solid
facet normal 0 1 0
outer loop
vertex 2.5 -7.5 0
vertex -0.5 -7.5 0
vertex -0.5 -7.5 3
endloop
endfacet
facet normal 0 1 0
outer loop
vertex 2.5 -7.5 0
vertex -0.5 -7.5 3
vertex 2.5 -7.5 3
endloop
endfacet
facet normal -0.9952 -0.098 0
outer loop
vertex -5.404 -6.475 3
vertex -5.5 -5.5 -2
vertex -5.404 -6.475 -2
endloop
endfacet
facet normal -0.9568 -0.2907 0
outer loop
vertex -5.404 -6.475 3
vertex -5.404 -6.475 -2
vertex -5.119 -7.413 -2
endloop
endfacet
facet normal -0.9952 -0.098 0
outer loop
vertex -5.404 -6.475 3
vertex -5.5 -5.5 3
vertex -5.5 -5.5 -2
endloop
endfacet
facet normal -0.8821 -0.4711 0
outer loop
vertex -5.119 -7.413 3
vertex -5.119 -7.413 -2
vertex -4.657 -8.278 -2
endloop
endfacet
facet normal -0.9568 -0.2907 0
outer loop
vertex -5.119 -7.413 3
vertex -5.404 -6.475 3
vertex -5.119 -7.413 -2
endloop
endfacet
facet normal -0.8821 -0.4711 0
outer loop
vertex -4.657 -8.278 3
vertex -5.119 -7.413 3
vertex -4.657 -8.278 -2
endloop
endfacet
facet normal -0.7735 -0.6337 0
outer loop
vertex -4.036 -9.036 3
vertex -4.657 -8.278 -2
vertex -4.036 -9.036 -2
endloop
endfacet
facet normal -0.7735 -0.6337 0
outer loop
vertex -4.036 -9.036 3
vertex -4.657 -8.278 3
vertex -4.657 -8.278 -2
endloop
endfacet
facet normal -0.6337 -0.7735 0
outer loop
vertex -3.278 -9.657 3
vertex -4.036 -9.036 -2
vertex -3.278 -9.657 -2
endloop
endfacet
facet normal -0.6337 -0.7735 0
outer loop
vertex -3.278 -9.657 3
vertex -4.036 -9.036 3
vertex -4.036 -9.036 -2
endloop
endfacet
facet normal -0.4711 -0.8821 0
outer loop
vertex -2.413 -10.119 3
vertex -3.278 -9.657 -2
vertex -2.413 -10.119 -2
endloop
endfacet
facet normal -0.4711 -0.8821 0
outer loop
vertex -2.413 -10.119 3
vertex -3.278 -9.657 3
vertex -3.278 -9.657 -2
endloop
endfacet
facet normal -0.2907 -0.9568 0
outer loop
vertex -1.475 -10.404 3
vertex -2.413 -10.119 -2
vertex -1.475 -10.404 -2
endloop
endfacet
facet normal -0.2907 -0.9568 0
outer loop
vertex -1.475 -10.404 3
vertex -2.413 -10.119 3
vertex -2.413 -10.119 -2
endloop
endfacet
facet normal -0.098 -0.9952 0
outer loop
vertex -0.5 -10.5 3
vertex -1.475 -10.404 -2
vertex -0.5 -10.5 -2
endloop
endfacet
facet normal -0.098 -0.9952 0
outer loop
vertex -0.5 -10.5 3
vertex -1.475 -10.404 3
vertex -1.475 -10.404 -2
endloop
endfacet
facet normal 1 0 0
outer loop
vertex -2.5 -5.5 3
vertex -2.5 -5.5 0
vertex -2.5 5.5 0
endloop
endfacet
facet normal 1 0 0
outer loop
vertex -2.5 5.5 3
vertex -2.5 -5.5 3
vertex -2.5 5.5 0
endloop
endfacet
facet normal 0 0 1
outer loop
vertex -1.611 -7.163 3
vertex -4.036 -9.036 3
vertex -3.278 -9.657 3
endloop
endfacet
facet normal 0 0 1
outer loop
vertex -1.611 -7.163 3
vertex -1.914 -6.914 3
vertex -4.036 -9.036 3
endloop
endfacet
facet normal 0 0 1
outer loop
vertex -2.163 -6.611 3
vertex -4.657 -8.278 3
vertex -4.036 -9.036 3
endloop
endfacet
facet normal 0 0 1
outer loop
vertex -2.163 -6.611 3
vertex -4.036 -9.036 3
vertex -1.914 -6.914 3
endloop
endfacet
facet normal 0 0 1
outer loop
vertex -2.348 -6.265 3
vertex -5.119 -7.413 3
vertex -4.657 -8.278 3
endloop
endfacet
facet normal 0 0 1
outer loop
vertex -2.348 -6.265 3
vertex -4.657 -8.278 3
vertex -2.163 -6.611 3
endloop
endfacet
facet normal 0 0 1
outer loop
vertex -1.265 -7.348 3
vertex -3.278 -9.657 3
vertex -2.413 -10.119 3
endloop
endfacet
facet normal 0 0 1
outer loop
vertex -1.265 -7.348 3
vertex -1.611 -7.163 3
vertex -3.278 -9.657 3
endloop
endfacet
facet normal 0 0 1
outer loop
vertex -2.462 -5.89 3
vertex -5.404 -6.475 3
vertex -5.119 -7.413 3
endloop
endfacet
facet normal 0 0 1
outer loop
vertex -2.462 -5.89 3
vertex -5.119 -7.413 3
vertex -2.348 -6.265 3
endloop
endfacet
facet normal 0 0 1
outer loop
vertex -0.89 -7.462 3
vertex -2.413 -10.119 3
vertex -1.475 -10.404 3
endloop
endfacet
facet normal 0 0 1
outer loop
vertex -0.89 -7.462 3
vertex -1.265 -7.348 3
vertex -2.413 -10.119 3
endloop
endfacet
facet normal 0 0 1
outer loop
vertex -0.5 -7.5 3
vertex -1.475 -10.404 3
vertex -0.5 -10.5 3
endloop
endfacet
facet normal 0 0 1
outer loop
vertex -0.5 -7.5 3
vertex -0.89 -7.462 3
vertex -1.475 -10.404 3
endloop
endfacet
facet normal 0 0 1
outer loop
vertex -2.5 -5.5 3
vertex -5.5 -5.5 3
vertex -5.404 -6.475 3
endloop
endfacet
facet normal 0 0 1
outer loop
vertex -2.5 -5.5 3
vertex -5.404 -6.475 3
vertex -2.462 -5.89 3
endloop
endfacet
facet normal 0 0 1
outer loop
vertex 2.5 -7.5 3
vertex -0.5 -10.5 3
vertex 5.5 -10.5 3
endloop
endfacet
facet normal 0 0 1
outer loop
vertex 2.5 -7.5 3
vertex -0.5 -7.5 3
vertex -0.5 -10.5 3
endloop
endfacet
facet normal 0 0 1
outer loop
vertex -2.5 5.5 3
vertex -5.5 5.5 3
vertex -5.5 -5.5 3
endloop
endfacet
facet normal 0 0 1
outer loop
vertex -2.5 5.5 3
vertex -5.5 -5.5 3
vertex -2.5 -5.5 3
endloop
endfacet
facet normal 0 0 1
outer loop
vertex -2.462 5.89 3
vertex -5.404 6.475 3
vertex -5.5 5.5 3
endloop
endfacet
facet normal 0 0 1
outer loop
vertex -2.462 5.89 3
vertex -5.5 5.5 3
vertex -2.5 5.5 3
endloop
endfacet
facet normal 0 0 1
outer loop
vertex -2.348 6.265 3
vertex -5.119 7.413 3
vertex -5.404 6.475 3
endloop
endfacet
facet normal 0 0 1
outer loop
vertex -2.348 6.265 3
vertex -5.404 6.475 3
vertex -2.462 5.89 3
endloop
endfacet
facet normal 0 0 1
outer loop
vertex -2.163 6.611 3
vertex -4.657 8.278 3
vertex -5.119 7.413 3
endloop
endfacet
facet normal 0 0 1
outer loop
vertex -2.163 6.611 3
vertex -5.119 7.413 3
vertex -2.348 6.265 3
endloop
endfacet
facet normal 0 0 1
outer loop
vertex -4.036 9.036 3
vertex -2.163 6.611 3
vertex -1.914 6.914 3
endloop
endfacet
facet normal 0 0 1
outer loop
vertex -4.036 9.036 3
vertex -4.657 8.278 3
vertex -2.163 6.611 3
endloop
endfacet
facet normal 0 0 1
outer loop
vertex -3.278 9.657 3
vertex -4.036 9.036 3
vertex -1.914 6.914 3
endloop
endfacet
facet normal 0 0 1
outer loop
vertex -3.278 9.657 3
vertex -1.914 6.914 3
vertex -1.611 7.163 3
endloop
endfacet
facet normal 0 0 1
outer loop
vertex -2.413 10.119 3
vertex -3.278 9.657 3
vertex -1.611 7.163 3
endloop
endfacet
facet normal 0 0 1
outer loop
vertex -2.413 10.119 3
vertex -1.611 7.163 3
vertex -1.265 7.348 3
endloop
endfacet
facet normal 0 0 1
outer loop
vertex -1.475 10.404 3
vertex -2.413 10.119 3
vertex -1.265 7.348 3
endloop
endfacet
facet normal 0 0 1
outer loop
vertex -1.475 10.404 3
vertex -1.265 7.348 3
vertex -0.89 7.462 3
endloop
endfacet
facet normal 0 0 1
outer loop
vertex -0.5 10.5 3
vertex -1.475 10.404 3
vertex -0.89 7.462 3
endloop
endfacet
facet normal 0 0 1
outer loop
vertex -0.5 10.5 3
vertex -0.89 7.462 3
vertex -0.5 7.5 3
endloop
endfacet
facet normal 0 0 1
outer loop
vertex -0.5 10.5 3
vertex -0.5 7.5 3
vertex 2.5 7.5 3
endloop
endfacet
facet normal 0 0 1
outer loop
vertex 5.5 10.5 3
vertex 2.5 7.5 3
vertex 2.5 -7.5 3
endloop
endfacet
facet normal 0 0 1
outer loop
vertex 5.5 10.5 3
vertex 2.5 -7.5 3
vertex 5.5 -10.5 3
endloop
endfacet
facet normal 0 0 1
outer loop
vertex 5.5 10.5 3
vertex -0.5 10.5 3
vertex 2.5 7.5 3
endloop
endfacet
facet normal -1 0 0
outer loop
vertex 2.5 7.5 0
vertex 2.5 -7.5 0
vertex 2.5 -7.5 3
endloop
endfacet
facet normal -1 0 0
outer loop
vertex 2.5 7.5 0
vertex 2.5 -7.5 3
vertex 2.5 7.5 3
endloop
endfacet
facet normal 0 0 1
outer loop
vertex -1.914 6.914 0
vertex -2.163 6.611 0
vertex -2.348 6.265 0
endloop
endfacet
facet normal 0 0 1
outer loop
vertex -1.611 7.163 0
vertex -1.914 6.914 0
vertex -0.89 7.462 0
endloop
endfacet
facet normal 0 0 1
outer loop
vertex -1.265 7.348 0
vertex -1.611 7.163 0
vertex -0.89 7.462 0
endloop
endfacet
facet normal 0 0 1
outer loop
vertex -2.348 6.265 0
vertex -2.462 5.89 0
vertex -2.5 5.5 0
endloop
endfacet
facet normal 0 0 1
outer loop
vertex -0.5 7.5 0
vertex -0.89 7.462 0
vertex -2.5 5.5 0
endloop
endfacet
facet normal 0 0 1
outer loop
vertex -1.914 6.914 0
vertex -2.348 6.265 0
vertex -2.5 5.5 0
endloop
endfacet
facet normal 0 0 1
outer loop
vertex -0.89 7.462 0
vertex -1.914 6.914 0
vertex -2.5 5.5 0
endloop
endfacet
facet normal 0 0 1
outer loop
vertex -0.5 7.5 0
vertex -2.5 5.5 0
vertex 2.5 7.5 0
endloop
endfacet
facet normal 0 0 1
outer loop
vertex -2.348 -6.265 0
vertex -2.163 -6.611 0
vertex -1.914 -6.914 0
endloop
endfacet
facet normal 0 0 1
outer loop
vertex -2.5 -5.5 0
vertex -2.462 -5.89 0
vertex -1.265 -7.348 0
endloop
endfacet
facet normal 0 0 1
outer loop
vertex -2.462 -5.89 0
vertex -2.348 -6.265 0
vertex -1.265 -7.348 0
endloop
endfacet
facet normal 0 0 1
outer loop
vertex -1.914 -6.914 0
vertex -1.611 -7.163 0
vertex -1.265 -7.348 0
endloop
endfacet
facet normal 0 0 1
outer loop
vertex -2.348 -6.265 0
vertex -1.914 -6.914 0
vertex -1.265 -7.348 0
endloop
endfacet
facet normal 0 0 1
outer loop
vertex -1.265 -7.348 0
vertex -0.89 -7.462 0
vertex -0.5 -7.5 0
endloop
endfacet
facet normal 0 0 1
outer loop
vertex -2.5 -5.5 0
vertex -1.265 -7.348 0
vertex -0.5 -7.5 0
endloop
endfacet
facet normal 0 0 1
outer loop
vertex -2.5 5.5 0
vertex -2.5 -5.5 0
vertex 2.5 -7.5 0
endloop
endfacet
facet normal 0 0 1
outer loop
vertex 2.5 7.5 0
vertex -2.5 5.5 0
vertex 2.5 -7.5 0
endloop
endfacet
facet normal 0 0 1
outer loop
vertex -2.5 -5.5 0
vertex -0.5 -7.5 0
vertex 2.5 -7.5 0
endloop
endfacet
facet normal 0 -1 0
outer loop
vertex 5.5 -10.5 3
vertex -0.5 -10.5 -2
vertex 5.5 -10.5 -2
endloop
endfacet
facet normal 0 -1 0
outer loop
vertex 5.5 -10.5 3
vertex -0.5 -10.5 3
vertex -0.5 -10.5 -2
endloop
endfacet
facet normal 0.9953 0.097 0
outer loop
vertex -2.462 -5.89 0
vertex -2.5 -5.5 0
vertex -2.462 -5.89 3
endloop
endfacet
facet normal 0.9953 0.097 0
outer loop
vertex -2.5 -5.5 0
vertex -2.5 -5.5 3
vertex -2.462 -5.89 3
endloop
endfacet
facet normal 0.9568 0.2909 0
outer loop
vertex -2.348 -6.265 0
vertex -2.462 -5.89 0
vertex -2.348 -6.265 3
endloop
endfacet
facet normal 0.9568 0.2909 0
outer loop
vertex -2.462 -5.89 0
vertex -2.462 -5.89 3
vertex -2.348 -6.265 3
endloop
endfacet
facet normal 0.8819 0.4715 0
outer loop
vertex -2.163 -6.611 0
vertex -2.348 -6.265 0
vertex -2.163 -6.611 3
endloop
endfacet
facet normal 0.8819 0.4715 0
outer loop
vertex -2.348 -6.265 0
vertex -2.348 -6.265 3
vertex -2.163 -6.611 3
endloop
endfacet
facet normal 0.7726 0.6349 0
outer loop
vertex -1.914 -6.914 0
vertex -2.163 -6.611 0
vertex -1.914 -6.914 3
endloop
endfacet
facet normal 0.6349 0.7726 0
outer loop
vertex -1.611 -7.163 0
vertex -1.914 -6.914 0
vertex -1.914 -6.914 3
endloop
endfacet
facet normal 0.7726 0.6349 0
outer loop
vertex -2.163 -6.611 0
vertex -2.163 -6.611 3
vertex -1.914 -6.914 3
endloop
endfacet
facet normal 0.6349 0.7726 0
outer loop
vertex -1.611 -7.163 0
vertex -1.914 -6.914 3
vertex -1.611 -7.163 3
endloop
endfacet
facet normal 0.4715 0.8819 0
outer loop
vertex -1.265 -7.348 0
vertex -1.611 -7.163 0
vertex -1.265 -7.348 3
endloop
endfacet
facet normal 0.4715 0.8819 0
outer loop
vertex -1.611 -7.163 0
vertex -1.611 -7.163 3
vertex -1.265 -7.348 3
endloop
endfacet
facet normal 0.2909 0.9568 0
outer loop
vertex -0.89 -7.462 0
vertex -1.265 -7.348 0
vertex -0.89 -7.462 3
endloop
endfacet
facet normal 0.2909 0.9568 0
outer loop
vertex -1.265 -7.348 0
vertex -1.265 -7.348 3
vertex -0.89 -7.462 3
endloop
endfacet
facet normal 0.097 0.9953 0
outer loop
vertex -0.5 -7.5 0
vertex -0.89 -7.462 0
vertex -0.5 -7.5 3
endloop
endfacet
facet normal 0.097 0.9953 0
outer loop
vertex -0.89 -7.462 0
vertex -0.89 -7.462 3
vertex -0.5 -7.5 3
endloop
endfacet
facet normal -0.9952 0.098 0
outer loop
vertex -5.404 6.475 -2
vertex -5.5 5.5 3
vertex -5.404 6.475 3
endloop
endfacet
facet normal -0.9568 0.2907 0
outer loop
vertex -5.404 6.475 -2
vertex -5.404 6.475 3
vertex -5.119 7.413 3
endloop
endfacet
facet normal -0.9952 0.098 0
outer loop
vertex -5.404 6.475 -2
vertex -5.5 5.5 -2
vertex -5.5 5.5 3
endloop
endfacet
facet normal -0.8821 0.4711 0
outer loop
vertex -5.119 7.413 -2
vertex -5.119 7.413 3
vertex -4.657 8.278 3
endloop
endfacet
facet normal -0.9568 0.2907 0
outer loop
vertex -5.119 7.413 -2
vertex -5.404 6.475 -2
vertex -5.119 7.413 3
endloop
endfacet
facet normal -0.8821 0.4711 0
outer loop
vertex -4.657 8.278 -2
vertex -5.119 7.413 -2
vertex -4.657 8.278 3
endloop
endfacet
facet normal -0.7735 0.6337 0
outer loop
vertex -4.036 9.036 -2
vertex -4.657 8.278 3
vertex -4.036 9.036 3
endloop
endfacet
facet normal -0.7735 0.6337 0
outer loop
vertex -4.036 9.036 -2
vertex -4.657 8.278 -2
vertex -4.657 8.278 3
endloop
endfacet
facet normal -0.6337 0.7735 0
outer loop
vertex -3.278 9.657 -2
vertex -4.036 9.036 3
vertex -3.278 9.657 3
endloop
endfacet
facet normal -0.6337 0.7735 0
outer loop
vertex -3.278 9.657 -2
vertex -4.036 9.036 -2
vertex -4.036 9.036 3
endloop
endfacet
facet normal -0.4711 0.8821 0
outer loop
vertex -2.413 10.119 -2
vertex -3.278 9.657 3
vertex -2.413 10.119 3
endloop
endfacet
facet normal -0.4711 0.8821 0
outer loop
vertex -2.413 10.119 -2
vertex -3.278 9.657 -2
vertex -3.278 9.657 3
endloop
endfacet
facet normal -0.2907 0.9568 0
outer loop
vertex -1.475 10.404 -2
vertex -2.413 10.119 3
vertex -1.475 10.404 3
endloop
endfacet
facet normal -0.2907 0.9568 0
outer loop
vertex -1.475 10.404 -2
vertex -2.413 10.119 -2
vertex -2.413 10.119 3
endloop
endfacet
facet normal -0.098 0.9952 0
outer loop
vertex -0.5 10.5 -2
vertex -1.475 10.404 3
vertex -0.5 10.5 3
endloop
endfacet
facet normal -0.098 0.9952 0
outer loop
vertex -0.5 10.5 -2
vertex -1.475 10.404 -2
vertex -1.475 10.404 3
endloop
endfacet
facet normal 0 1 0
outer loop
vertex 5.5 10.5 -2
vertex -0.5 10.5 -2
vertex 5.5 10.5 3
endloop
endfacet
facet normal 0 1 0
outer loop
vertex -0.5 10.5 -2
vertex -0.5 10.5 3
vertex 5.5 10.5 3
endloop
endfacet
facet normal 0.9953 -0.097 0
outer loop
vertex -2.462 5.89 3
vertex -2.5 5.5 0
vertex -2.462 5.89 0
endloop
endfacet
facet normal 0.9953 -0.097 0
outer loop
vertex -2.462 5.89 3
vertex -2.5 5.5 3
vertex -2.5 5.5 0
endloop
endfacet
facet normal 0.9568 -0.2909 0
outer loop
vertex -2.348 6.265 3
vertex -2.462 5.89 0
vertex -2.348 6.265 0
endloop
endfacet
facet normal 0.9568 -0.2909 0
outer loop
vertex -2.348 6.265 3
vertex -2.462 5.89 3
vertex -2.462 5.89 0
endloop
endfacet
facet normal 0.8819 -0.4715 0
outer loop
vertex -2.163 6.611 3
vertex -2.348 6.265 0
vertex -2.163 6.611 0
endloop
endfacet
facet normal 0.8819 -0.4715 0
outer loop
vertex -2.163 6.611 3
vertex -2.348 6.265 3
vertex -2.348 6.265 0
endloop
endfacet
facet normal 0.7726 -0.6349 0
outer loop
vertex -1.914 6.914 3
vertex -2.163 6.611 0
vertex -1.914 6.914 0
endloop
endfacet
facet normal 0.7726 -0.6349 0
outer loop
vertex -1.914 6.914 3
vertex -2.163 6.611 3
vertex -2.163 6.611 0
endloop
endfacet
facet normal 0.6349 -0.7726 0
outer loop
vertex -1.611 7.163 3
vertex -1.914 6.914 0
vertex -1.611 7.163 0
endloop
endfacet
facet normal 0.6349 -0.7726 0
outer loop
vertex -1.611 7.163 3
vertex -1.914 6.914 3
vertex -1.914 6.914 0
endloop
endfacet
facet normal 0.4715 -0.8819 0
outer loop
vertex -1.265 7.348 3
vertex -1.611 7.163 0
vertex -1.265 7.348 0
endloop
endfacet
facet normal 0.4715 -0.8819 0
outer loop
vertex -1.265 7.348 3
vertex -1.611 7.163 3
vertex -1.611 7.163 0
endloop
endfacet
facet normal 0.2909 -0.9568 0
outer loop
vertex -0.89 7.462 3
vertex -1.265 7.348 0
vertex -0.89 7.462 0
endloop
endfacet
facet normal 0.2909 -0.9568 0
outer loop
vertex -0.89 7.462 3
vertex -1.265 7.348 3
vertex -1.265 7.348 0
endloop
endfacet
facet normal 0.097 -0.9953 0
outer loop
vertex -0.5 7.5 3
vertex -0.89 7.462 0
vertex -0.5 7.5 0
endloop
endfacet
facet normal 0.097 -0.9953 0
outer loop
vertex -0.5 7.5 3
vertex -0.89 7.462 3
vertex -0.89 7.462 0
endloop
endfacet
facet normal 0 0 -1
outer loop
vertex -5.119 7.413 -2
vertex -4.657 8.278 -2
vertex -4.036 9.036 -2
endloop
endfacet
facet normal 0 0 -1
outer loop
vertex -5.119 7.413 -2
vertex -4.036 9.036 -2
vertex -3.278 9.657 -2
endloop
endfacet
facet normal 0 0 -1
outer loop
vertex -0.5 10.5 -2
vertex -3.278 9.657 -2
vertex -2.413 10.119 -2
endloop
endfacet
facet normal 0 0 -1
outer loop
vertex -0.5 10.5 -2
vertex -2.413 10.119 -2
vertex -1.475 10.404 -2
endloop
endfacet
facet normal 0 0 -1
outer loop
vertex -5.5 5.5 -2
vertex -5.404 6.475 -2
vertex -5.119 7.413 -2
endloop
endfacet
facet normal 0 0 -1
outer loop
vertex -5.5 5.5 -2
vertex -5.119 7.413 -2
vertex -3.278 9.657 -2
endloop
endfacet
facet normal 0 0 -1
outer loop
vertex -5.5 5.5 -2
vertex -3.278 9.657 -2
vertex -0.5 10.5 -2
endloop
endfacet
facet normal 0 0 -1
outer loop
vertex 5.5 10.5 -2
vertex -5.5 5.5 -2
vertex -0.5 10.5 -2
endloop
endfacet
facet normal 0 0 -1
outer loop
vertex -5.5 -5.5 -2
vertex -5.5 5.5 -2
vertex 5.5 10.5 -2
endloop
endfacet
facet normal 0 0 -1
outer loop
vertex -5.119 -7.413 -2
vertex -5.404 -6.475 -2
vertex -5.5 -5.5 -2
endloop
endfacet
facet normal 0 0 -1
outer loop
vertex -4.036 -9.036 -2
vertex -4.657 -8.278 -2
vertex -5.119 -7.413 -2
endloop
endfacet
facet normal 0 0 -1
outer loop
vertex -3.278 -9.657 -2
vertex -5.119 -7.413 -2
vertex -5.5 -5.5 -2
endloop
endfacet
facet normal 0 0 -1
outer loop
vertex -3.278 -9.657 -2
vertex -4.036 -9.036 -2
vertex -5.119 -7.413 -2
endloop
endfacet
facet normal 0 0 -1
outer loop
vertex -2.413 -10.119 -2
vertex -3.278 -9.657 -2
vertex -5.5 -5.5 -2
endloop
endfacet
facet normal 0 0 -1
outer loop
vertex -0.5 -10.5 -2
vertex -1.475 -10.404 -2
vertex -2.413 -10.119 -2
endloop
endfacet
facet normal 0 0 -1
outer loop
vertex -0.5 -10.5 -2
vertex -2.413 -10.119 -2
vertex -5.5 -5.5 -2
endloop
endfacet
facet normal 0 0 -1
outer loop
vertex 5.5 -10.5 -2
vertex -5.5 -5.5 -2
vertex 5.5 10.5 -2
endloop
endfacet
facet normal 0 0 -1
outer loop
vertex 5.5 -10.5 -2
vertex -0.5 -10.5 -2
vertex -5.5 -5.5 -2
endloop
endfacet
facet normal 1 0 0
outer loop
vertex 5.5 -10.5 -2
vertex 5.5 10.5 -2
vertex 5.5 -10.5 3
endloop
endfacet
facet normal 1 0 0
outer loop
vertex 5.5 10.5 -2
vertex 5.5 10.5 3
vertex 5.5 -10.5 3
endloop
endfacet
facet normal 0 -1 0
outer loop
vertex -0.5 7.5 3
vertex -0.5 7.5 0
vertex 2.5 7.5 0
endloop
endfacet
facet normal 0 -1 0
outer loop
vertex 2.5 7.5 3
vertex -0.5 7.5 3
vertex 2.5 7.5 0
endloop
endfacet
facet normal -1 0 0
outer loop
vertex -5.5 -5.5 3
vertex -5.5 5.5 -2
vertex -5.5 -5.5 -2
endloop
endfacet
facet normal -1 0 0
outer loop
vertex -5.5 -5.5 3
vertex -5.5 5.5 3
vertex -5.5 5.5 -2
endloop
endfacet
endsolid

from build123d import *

# Parameters (mm, degrees)
F0_W     = 11
F0_H     = 21
F0_W_2   = 5
F0_H_2   = 15
F1_DEPTH = 3
F2_W     = 11
F2_H     = 21
F3_DEPTH = 2
F4_R     = 2
F5_R     = 5


with BuildPart() as f1:
    # F0 (on Top) → F1 (new body)
    with BuildSketch(Plane.XY):
        Rectangle(F0_W, F0_H)
        Rectangle(F0_W_2, F0_H_2, mode=Mode.SUBTRACT)
    extrude(amount=F1_DEPTH)

    # F2 (on face) → F3 (join)
    with BuildSketch(Plane(origin=(0, 0, 0), x_dir=(1, 0, 0), z_dir=(0, 0, -1))):
        Rectangle(F2_W, F2_H)
    extrude(amount=F3_DEPTH)

    # F4
    f4_edges = [f1.edges().sort_by_distance(p)[0] for p in [
        (-2.5, -7.5, 1.5),
        (-2.5, 7.5, 1.5),
    ]]
    fillet(f4_edges, radius=F4_R)

    # F5
    f5_edges = [f1.edges().sort_by_distance(p)[0] for p in [
        (-5.5, -10.5, 0.5),
        (-5.5, 10.5, 0.5),
    ]]
    fillet(f5_edges, radius=F5_R)


solid = f1.part
